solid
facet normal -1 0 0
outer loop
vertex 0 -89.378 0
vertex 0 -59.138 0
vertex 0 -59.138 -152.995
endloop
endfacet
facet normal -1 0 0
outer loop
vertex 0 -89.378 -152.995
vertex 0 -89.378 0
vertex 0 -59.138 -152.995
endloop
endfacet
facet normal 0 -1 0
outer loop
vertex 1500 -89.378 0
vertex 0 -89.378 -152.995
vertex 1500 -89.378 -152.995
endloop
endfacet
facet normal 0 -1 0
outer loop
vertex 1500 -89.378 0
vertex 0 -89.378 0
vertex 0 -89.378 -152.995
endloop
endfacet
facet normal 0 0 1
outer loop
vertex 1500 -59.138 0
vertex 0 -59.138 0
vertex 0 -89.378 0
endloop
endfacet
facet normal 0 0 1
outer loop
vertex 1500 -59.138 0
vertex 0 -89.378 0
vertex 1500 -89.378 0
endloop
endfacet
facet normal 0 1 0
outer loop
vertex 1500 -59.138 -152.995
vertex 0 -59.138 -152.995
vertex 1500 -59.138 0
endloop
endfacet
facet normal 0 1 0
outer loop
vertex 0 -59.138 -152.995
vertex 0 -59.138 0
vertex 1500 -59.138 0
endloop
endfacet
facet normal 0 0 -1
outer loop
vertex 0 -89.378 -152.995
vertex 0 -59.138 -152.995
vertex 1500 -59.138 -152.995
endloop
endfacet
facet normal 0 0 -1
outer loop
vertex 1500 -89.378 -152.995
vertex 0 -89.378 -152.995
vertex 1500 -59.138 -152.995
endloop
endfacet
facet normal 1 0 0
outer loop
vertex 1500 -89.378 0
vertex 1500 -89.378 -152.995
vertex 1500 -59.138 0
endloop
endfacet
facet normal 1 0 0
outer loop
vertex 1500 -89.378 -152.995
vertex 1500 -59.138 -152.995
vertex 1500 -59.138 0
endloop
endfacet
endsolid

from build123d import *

# Parameters (mm, degrees)
F0_W     = 7.2391442955
F0_H     = 22.994980216
F1_DEPTH = 1500
F2_DEPTH = 130
F3_DEPTH = 23


with BuildPart() as f1:
    # F0 (on Right) → F1 (new body)
    with BuildSketch(Plane.YZ):
        with Locations((-62.7580676228, -11.497490108)):
            Rectangle(F0_W, F0_H)
    extrude(amount=F1_DEPTH)

    # F2 (add): a face of the model
    f2_faces = [f1.faces().sort_by_distance(p)[0] for p in [
        (750, -62.7580676228, -22.994980216),
    ]]
    extrude(f2_faces, amount=F2_DEPTH)

    # F3 (add): a face of the model
    f3_faces = [f1.faces().sort_by_distance(p)[0] for p in [
        (750, -66.3776397705, -76.497490108),
    ]]
    extrude(f3_faces, amount=F3_DEPTH)


solid = f1.part
